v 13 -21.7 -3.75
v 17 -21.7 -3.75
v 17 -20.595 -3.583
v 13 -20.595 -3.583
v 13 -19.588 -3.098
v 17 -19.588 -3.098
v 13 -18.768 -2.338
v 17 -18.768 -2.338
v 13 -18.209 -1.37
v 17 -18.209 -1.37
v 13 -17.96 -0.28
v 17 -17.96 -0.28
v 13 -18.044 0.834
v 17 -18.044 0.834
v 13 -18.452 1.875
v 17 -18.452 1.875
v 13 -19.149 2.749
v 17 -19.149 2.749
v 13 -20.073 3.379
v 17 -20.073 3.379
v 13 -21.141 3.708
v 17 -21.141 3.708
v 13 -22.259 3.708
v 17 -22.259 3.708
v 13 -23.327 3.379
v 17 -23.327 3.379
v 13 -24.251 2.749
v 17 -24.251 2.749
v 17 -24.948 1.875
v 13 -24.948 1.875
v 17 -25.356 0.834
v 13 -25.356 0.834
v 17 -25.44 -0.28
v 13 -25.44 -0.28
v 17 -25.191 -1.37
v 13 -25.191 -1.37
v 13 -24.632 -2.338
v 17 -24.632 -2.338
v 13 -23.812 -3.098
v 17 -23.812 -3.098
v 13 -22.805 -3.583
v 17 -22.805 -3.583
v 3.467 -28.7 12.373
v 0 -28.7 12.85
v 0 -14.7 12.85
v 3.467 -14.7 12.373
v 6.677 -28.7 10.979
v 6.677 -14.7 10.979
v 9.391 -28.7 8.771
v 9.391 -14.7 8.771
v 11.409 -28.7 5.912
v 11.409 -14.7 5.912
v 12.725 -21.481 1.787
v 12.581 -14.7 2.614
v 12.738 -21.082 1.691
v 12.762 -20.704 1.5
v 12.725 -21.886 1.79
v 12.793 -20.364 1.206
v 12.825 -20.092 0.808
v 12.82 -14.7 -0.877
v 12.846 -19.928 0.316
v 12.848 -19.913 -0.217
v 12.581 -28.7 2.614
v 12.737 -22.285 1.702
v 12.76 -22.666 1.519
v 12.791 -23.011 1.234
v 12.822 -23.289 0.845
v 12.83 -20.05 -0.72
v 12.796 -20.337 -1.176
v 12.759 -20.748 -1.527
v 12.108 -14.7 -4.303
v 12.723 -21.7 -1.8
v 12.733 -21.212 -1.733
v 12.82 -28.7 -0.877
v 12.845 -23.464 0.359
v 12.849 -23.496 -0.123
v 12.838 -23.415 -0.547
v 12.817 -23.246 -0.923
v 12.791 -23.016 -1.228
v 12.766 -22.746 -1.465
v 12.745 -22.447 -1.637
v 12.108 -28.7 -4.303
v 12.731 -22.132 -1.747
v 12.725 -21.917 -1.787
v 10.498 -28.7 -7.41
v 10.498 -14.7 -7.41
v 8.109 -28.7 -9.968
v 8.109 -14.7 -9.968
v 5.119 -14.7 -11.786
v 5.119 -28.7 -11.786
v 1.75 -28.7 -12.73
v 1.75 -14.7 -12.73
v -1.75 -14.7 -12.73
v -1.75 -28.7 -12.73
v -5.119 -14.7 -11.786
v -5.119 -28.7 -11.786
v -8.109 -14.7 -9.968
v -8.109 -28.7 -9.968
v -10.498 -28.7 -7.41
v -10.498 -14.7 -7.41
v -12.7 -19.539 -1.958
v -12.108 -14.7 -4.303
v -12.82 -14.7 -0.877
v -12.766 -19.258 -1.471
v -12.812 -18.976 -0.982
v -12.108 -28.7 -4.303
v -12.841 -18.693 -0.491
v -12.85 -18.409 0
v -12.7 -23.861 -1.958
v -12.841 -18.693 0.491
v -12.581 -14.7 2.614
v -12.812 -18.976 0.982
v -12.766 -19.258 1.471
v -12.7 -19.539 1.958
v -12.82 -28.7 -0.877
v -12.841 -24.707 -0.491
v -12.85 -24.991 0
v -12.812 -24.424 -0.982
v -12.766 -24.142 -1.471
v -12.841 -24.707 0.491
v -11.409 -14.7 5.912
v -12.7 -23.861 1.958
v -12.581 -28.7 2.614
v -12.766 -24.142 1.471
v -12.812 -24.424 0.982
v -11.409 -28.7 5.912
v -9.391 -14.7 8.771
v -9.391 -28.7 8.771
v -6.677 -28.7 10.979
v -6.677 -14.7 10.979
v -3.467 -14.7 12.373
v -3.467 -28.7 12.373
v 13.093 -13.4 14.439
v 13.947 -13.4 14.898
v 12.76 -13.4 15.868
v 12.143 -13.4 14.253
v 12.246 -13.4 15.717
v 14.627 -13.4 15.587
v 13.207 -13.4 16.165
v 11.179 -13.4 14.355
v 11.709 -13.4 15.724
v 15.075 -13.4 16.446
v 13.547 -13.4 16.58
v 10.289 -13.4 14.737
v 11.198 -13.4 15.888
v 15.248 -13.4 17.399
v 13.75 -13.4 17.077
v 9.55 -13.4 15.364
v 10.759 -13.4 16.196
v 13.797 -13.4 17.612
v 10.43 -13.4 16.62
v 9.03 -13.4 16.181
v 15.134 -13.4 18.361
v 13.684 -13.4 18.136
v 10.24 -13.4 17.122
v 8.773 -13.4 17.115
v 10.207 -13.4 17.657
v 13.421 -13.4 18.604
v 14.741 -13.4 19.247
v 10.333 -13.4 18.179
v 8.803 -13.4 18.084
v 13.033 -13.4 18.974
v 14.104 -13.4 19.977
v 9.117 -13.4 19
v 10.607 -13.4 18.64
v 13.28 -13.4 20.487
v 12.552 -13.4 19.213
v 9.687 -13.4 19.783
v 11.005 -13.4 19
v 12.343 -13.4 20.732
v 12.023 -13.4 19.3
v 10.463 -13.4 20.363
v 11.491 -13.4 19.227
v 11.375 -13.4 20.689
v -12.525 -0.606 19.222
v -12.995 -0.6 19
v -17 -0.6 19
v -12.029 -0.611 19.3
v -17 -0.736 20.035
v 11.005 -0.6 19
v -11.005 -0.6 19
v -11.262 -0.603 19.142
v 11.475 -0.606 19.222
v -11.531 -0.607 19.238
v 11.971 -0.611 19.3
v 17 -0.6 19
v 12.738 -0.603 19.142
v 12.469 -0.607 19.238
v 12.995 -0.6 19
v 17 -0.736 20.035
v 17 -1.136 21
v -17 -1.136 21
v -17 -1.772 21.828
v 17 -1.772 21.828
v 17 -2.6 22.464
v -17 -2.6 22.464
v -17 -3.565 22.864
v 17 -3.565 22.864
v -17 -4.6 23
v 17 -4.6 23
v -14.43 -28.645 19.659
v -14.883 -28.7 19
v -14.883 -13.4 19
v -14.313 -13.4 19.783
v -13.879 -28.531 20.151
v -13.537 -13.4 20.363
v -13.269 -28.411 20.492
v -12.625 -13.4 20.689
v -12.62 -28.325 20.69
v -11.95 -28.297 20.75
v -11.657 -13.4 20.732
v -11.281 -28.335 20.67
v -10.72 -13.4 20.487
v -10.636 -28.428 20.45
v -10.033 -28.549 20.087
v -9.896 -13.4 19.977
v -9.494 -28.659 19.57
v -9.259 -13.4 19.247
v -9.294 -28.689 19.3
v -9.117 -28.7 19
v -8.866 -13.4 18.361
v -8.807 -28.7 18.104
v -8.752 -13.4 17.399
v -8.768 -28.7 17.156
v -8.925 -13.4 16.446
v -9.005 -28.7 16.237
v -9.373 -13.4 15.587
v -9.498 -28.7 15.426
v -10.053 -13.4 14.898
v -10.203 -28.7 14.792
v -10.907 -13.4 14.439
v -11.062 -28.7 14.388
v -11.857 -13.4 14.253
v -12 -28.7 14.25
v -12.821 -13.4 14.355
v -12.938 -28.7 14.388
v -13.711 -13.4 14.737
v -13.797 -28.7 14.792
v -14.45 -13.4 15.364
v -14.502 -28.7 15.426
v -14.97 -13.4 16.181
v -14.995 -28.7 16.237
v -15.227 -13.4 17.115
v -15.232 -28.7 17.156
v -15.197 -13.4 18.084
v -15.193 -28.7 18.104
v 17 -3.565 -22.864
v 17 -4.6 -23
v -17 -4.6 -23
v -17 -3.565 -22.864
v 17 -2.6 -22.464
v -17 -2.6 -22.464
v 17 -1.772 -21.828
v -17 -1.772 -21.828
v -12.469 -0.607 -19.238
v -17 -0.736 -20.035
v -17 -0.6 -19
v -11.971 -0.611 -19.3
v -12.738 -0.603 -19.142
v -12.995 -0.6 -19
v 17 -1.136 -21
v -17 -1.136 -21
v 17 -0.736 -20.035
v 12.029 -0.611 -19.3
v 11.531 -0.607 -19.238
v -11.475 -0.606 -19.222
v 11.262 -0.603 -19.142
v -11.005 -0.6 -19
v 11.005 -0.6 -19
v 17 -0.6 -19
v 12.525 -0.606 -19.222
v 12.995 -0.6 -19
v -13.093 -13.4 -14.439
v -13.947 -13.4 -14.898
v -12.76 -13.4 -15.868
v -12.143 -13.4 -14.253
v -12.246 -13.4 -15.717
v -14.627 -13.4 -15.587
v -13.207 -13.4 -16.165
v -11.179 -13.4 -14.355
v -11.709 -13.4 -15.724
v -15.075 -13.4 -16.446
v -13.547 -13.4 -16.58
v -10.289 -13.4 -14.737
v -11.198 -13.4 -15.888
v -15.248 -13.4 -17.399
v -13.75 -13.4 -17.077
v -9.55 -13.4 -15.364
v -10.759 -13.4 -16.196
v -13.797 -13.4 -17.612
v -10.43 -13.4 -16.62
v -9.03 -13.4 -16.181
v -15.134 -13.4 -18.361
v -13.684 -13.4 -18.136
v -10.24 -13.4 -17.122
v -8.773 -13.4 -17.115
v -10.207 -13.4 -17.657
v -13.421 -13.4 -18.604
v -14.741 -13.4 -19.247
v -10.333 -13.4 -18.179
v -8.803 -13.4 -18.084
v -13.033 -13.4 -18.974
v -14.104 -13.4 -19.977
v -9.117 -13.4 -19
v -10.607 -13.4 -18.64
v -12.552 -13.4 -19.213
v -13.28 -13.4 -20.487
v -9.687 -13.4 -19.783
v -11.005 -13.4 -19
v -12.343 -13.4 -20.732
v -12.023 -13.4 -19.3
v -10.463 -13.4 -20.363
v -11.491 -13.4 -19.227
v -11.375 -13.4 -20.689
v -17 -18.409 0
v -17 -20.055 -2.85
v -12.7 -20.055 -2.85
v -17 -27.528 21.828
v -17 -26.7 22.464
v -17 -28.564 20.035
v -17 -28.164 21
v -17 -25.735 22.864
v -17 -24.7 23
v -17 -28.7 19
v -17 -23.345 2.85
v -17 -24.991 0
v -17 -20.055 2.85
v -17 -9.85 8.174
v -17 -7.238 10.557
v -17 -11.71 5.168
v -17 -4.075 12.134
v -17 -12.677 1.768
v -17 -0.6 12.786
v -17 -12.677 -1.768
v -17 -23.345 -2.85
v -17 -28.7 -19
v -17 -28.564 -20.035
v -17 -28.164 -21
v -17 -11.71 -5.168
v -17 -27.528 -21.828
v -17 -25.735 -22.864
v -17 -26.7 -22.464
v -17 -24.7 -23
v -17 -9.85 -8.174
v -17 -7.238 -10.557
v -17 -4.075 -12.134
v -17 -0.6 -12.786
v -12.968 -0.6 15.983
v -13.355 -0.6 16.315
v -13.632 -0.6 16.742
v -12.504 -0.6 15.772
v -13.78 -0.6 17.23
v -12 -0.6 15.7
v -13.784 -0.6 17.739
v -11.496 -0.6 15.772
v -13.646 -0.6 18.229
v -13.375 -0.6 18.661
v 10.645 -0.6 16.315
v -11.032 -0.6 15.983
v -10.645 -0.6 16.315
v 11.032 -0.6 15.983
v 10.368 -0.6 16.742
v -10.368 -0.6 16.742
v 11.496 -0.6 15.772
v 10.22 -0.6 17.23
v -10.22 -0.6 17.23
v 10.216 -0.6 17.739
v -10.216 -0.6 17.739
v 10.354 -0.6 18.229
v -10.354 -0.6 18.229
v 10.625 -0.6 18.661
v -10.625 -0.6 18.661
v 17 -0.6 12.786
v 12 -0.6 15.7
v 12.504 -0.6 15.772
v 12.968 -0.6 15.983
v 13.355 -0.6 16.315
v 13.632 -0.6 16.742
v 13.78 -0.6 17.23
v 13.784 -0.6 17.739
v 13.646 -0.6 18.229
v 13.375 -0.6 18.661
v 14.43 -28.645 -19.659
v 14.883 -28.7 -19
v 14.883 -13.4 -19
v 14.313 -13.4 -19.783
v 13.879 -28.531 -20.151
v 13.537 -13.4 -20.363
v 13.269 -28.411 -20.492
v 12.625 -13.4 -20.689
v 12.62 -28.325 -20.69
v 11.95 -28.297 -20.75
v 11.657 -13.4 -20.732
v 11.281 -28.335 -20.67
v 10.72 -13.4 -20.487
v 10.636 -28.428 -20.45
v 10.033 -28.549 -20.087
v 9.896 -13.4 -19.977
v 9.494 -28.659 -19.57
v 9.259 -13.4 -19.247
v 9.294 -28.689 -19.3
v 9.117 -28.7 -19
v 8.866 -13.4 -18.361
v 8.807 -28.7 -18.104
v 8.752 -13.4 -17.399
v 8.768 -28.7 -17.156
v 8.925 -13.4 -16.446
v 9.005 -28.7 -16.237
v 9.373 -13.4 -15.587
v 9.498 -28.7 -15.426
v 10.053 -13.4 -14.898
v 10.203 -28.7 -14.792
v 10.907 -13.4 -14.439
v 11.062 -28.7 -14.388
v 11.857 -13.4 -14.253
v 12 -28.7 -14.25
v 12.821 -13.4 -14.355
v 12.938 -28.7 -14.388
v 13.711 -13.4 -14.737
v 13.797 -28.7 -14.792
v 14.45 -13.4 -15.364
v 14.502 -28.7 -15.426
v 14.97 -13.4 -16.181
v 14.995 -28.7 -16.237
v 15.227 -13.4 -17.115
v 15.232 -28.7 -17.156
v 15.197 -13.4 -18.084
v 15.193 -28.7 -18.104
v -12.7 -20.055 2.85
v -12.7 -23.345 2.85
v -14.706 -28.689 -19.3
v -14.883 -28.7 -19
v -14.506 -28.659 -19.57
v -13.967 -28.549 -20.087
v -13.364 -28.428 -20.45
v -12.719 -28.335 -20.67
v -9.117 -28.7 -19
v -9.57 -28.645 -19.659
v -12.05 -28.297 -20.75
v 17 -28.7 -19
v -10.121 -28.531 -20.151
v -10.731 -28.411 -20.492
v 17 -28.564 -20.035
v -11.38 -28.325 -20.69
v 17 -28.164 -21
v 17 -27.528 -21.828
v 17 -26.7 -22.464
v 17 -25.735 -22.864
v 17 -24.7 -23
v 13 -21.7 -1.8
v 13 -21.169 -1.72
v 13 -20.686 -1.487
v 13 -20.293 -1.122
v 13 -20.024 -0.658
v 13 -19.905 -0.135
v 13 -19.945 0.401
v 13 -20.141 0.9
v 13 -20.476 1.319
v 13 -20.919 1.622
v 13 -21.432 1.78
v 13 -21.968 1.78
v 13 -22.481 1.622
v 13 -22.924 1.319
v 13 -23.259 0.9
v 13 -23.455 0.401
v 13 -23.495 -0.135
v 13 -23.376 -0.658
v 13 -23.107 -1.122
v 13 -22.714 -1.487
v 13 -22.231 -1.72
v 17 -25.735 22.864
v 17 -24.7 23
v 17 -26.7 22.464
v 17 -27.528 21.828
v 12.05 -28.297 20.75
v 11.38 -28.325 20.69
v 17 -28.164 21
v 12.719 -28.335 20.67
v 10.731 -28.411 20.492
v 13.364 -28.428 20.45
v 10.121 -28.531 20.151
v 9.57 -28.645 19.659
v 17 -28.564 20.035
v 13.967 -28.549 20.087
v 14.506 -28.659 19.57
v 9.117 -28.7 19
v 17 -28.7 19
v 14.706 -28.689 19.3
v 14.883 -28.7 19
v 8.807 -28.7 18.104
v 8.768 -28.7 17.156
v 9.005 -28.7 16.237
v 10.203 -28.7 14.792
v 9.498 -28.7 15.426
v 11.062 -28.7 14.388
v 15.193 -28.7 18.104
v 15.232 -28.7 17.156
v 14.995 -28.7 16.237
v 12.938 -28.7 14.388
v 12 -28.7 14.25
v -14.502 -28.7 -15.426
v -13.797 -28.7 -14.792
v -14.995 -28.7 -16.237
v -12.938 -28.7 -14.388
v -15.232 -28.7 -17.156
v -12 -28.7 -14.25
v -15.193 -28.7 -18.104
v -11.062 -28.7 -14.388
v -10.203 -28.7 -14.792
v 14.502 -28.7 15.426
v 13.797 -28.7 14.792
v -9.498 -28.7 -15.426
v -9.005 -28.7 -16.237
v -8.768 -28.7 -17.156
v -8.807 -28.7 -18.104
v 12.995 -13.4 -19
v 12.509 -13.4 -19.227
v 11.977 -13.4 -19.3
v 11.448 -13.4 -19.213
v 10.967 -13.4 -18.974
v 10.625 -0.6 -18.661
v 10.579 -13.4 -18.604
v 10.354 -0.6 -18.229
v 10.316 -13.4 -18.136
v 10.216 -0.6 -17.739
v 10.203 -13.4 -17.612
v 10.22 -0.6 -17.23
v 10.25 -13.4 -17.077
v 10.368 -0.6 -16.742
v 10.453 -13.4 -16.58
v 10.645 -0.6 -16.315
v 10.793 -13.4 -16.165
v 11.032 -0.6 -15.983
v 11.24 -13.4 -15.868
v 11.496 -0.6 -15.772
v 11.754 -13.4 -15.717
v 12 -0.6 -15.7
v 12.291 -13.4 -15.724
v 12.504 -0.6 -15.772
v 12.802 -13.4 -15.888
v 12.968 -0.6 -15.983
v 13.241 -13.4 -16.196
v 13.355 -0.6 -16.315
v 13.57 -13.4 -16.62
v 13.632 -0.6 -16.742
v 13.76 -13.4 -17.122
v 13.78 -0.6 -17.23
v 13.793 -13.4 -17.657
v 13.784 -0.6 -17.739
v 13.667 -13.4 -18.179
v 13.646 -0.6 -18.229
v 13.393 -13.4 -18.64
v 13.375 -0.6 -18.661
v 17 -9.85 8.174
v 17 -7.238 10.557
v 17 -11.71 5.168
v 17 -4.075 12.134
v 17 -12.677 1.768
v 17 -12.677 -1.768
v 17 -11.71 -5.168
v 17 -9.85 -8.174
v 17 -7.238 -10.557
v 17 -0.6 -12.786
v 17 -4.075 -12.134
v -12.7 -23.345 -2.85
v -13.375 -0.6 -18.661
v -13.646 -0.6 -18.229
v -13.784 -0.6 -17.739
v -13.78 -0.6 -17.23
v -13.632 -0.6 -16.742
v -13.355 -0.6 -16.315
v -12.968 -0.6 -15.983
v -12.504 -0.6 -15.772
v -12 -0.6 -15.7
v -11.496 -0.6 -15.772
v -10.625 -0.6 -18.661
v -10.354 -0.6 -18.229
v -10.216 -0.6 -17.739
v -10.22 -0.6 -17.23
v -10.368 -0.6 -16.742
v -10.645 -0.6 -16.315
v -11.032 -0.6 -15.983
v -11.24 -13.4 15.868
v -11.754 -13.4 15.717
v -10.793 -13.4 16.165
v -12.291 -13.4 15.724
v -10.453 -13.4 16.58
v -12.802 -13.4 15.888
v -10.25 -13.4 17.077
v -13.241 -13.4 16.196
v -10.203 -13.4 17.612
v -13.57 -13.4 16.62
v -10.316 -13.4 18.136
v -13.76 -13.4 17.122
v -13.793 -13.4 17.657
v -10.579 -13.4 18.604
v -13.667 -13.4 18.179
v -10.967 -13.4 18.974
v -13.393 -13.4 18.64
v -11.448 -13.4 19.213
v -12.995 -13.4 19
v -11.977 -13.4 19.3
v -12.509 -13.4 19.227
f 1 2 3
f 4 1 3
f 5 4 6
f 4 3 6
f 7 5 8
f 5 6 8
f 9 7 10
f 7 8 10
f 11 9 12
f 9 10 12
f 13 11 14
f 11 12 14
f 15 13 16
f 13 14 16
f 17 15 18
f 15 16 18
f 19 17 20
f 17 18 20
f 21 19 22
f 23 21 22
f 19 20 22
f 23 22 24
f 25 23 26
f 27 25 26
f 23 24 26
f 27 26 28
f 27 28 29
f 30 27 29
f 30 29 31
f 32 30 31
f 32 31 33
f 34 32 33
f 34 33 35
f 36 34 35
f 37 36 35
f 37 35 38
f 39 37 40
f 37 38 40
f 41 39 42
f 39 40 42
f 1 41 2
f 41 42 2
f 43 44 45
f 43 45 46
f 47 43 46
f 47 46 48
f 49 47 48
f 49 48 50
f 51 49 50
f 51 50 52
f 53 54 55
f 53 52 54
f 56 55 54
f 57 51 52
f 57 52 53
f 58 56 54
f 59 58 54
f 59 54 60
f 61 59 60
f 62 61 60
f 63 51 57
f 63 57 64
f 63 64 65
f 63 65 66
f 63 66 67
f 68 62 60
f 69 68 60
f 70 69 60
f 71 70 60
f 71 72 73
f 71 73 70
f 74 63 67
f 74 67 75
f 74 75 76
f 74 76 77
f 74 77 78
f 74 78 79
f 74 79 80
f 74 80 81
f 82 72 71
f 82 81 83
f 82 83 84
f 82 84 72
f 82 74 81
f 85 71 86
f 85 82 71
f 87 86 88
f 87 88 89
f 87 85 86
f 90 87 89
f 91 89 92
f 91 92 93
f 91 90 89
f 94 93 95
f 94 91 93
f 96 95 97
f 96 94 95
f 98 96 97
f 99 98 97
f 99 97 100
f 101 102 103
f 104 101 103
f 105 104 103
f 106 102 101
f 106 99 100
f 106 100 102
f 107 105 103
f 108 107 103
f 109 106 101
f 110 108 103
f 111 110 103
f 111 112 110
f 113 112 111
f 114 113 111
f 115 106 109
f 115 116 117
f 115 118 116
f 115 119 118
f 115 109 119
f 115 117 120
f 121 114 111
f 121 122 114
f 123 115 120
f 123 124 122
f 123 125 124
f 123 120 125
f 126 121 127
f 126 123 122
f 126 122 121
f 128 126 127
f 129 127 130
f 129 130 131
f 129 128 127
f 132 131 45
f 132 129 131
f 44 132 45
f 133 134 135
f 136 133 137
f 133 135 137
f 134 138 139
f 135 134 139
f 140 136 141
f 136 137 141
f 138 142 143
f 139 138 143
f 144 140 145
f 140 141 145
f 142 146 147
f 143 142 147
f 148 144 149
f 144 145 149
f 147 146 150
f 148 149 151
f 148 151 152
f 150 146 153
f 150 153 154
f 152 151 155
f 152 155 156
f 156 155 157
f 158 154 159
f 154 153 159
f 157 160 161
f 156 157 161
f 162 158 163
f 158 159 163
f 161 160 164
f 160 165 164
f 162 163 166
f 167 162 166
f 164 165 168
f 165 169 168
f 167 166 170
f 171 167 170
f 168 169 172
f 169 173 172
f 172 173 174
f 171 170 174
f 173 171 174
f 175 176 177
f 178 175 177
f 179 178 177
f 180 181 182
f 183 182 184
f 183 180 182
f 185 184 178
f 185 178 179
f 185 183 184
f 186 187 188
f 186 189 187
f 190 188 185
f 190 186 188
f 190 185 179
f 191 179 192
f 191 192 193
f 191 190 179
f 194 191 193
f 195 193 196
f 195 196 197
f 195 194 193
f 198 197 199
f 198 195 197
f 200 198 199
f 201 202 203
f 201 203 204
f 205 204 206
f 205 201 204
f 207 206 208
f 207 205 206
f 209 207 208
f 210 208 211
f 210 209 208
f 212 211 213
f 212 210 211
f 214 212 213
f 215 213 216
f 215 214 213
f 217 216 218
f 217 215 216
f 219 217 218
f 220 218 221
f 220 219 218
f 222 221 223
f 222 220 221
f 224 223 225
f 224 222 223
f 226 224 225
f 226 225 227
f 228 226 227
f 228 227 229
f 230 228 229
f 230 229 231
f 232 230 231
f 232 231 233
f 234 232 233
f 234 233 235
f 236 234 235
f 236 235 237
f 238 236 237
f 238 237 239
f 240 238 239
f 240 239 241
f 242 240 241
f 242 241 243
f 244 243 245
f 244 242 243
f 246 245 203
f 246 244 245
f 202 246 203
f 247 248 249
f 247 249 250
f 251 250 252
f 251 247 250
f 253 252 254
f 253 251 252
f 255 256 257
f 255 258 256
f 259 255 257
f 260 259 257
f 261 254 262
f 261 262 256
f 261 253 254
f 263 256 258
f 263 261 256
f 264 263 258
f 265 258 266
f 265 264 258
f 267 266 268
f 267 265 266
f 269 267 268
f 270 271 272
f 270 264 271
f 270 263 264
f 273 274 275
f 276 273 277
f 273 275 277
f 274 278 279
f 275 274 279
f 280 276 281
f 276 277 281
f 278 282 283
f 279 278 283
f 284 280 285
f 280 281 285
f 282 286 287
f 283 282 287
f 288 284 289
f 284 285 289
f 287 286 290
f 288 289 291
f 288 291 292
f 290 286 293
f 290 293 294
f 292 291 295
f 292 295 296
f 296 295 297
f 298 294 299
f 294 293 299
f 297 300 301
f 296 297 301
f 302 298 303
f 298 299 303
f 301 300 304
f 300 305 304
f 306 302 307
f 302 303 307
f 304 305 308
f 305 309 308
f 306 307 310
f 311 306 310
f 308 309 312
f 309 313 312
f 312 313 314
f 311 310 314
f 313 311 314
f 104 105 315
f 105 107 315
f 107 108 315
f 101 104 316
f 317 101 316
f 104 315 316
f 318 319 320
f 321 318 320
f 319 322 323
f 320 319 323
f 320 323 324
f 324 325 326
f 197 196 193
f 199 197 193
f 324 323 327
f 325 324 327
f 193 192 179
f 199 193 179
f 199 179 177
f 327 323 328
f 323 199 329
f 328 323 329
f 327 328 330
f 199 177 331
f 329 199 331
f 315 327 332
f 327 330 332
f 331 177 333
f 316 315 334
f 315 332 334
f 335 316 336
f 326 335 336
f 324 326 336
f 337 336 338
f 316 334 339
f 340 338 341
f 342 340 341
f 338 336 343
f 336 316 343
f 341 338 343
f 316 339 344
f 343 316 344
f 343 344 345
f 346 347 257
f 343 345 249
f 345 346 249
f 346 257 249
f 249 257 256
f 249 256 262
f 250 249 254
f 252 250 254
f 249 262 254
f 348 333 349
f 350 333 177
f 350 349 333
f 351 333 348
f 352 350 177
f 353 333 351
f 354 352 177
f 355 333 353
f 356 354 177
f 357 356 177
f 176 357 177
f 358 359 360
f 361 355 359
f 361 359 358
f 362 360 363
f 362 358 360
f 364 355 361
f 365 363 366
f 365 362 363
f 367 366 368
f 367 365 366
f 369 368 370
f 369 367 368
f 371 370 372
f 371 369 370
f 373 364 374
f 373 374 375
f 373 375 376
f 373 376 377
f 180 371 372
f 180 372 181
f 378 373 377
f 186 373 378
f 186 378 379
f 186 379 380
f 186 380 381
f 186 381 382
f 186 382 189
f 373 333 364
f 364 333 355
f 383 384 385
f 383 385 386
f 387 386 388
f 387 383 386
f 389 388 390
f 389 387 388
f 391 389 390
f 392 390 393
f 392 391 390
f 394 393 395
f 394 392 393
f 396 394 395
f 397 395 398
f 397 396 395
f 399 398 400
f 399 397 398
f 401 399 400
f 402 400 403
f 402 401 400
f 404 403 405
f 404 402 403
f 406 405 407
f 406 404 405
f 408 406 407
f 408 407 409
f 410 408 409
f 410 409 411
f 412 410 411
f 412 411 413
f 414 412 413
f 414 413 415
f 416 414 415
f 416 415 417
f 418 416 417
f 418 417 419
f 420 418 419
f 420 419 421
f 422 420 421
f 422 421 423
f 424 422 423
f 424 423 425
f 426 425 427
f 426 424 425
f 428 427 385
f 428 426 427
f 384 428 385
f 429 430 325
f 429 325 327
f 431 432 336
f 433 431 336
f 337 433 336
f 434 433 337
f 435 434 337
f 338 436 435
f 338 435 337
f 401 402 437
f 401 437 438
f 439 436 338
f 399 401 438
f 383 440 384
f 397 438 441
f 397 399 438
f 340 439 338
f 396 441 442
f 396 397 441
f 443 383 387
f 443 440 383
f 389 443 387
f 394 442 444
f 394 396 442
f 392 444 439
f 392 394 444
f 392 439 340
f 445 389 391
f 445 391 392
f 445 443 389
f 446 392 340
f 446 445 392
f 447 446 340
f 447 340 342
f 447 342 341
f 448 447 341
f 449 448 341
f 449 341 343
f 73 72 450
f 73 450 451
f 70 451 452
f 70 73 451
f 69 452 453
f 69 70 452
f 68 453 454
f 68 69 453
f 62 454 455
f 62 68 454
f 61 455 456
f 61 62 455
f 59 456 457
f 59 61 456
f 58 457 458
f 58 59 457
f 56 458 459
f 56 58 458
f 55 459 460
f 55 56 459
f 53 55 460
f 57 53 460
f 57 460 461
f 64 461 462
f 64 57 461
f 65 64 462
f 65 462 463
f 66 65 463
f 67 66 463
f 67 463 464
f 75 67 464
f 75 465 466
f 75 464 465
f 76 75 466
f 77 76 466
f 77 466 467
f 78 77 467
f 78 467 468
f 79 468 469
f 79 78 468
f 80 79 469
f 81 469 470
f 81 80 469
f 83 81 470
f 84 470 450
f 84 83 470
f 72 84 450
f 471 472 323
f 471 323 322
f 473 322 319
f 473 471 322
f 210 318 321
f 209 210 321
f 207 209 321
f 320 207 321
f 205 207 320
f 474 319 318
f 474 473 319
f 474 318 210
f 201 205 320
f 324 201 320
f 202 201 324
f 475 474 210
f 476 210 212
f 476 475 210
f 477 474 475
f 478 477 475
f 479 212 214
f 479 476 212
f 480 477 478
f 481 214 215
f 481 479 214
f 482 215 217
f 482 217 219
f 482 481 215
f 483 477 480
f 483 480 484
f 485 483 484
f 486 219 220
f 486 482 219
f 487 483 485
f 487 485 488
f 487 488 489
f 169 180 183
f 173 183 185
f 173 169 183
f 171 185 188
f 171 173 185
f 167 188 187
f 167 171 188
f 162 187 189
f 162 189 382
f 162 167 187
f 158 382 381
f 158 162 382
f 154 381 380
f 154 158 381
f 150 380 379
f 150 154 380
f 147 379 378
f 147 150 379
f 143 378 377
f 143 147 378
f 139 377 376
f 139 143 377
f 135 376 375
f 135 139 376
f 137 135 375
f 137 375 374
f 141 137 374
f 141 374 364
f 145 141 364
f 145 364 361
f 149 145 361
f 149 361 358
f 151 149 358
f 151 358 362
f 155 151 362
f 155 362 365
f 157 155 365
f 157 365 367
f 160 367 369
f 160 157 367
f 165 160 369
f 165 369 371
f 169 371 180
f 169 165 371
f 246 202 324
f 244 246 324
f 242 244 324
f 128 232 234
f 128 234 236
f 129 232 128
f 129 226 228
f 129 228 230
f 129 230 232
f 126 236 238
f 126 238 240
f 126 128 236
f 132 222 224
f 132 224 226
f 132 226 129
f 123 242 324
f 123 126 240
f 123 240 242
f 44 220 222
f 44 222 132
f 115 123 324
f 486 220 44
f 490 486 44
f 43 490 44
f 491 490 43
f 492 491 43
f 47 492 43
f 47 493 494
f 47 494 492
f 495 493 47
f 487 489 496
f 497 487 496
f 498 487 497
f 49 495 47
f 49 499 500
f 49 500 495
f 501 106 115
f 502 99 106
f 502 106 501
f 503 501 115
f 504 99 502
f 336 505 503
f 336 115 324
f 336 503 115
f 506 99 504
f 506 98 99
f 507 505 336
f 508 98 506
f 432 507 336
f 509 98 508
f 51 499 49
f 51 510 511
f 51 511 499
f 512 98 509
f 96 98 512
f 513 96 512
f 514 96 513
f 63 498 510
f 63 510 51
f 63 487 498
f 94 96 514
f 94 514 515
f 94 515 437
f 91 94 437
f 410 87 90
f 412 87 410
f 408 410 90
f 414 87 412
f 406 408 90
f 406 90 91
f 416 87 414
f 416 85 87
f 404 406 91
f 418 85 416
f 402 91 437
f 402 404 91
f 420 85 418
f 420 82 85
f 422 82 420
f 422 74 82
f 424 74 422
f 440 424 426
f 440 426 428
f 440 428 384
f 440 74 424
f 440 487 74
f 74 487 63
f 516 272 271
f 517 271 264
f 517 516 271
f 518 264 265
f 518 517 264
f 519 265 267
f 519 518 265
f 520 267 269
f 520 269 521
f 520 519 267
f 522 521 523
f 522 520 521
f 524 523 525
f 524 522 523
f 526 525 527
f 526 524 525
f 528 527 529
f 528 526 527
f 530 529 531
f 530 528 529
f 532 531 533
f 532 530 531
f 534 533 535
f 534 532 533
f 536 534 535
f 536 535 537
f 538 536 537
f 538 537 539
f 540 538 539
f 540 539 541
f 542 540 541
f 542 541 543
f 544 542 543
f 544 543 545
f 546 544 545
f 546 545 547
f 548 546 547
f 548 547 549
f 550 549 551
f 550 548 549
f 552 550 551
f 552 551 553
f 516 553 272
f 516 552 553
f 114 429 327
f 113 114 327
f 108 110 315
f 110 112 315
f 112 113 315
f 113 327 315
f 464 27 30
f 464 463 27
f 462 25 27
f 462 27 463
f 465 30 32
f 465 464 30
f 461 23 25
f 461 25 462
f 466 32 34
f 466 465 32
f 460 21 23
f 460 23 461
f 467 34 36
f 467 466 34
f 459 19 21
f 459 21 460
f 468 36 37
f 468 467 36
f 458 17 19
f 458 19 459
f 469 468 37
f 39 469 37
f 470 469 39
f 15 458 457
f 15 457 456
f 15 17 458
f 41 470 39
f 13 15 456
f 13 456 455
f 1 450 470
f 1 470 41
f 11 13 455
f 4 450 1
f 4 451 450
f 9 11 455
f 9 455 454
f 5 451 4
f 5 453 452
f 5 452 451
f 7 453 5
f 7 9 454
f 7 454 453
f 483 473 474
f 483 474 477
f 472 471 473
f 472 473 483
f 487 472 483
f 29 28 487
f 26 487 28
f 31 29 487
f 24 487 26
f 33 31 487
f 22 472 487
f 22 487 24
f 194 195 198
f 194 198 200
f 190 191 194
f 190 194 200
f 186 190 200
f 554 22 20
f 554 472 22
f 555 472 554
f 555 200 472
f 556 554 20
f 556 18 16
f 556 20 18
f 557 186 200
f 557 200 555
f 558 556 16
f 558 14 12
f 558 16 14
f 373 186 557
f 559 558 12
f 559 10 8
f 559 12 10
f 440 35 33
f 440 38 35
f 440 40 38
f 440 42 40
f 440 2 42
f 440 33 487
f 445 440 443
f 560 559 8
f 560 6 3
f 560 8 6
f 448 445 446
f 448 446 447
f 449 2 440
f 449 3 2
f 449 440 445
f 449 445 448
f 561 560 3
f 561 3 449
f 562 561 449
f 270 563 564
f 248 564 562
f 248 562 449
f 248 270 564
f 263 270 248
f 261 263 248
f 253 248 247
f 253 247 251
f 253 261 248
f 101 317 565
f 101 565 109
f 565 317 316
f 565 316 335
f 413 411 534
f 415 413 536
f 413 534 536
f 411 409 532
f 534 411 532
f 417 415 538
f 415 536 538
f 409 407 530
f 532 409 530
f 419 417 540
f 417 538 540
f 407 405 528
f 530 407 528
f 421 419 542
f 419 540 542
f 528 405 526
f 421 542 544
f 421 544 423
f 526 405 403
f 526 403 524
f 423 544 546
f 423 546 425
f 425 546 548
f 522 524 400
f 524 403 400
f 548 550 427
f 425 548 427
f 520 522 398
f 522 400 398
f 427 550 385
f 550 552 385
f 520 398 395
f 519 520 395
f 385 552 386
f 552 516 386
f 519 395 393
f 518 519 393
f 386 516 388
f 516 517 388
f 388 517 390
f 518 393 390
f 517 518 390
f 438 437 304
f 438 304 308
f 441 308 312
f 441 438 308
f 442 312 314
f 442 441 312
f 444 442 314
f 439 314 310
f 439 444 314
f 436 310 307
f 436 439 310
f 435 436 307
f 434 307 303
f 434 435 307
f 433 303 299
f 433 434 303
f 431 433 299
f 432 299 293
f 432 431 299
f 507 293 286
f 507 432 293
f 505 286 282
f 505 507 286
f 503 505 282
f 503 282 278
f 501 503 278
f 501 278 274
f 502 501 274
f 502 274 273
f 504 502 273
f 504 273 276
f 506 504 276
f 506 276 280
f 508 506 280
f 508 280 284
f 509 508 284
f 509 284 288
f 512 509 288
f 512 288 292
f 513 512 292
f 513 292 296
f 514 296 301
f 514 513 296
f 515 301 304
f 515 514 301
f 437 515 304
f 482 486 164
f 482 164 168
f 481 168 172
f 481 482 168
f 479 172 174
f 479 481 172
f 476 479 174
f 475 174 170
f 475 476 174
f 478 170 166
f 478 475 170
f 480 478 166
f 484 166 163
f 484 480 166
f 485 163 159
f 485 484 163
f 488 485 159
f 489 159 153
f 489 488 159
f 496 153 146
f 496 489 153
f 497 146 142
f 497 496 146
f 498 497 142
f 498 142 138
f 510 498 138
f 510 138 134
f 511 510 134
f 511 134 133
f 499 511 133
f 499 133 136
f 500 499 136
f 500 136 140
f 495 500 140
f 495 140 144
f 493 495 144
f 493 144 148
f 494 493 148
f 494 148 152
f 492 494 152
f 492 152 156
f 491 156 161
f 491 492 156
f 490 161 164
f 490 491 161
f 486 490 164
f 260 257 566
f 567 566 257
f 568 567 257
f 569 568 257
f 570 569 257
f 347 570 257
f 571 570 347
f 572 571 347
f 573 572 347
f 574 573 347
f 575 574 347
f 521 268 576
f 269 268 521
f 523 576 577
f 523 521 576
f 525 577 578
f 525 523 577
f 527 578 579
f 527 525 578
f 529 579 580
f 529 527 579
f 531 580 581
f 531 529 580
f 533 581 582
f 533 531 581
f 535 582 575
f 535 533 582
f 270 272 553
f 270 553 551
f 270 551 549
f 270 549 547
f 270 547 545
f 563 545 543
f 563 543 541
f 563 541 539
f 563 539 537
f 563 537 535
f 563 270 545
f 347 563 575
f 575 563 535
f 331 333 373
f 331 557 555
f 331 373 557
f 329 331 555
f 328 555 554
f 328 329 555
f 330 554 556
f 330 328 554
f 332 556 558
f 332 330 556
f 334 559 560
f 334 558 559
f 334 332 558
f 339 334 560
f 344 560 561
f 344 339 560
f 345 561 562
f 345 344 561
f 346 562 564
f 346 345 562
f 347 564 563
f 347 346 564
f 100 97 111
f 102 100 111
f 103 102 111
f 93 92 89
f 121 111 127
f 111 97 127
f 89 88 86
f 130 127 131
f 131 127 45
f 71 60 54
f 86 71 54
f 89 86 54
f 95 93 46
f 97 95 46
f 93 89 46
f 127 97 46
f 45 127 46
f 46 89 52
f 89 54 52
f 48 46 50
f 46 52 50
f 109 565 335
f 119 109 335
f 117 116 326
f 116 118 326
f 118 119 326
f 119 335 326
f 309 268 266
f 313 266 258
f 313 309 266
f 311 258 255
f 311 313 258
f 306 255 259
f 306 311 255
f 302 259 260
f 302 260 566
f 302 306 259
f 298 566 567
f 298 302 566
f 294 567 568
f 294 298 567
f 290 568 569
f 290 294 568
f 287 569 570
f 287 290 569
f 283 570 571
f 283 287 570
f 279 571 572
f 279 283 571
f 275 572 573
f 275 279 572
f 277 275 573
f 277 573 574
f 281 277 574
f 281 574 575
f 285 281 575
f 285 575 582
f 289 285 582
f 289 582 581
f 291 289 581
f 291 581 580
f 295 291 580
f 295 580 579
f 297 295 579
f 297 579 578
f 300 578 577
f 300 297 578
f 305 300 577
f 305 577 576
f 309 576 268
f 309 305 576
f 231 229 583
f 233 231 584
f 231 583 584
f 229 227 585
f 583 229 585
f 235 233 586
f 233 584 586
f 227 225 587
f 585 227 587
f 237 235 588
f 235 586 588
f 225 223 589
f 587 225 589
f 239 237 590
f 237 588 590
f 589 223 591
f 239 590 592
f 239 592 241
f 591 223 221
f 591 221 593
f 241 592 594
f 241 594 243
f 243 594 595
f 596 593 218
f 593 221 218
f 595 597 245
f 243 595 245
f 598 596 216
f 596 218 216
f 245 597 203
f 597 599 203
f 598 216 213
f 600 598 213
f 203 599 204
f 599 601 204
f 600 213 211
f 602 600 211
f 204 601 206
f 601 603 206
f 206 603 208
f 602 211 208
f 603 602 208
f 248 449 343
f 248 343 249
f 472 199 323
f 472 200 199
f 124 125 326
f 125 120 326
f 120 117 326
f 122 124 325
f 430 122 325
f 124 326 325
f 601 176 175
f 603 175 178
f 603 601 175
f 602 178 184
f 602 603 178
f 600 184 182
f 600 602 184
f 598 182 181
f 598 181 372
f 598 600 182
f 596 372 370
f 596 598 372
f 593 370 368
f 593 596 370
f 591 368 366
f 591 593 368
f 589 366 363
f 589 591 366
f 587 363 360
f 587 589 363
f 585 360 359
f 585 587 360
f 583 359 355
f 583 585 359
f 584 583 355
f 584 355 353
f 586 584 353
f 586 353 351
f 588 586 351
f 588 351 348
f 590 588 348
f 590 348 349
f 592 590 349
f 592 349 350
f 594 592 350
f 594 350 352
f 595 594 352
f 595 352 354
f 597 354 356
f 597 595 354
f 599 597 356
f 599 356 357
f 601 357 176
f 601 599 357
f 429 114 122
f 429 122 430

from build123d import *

# Parameters (mm, degrees)
BOSS_EXTRUDE1_DEPTH     = 17
CUT_EXTRUDE1_DEPTH      = 41.517773878
CUT_EXTRUDE1_DEPTH_BACK = 41.517773878
SKETCH2_R               = 12.8
SKETCH3_R               = 1.8
CUT_EXTRUDE2_DEPTH      = 28.5
SKETCH4_R               = 3.25
CUT_EXTRUDE3_DEPTH      = 15.3
SKETCH5_R               = 12.85
CUT_EXTRUDE4_DEPTH      = 14
CUT_EXTRUDE5_DEPTH      = 41.517774047
CUT_EXTRUDE5_DEPTH_BACK = 41.517774047
SKETCH6_R               = 1.8
SKETCH7_R               = 3.75
CUT_EXTRUDE6_DEPTH      = 4
CUT_EXTRUDE7_DEPTH      = 4.3


with BuildPart() as part:
    # Sketch1 → Boss-Extrude1 (new, symmetric)
    with BuildSketch(Plane(origin=(0, 0, 0), x_dir=(0, 0, -1), z_dir=(1, 0, 0))):
        with BuildLine():
            Line((-19, -28.7), (19, -28.7))
            ThreePointArc((19, -28.7), (21.828427125, -27.528427125), (23, -24.7))
            Line((23, -24.7), (23, -4.6))
            ThreePointArc((23, -4.6), (21.828427125, -1.771572875), (19, -0.6))
            Line((19, -0.6), (-19, -0.6))
            ThreePointArc((-19, -0.6), (-21.828427125, -1.771572875), (-23, -4.6))
            Line((-23, -4.6), (-23, -24.7))
            ThreePointArc((-23, -24.7), (-21.828427125, -27.528427125), (-19, -28.7))
        make_face()
    extrude(amount=BOSS_EXTRUDE1_DEPTH, both=True)

    # Sketch2 → Cut-Extrude1 (cut, two sides: drawn at the far end of the back side and taken through both)
    with BuildSketch(Plane(origin=(0, 0, 0), x_dir=(0, 0, -1), z_dir=(1, 0, 0)).offset(-CUT_EXTRUDE1_DEPTH_BACK)):
        Circle(SKETCH2_R)
    extrude(amount=CUT_EXTRUDE1_DEPTH + CUT_EXTRUDE1_DEPTH_BACK, mode=Mode.SUBTRACT)

    # Sketch3 → Cut-Extrude2 (cut)
    with BuildSketch(Plane(origin=(0, -28.7, 0), x_dir=(1, 0, 0), z_dir=(0, 1, 0))):
        with Locations(Location((12, -17.5, 0), (0, 0, 236.442690238))):
            Circle(SKETCH3_R)
        with Locations(Location((12, 17.5, 0), (0, 0, 56.442690238))):
            Circle(SKETCH3_R)
        with Locations(Location((-12, -17.5, 0), (0, 0, 236.442690238))):
            Circle(SKETCH3_R)
        with Locations(Location((-12, 17.5, 0), (0, 0, 56.442690238))):
            Circle(SKETCH3_R)
    extrude(amount=CUT_EXTRUDE2_DEPTH, mode=Mode.SUBTRACT)

    # Sketch4 → Cut-Extrude3 (cut)
    with BuildSketch(Plane(origin=(0, -28.7, 0), x_dir=(1, 0, 0), z_dir=(0, 1, 0))):
        with Locations(Location((12, -17.5, 0), (0, 0, 207.48642625))):
            Circle(SKETCH4_R)
        with Locations(Location((12, 17.5, 0), (0, 0, 27.48642625))):
            Circle(SKETCH4_R)
        with Locations(Location((-12, -17.5, 0), (0, 0, 207.48642625))):
            Circle(SKETCH4_R)
        with Locations(Location((-12, 17.5, 0), (0, 0, 27.48642625))):
            Circle(SKETCH4_R)
    extrude(amount=CUT_EXTRUDE3_DEPTH, mode=Mode.SUBTRACT)

    # Sketch5 → Cut-Extrude4 (cut)
    with BuildSketch(Plane(origin=(0, -28.7, 0), x_dir=(1, 0, 0), z_dir=(0, 1, 0))):
        with Locations(Location((0, 0, 0), (0, 0, 270))):
            Circle(SKETCH5_R)
    extrude(amount=CUT_EXTRUDE4_DEPTH, mode=Mode.SUBTRACT)

    # Sketch6 → Cut-Extrude5 (cut, two sides: drawn at the far end of the back side and taken through both)
    with BuildSketch(Plane(origin=(0, 0, 0), x_dir=(0, 0, -1), z_dir=(1, 0, 0)).offset(-CUT_EXTRUDE5_DEPTH_BACK)):
        with Locations((0, -21.7)):
            Circle(SKETCH6_R)
    extrude(amount=CUT_EXTRUDE5_DEPTH + CUT_EXTRUDE5_DEPTH_BACK, mode=Mode.SUBTRACT)

    # Sketch7 → Cut-Extrude6 (cut)
    with BuildSketch(Plane(origin=(17, 0, 0), x_dir=(0, 0, -1), z_dir=(1, 0, 0))):
        with Locations((0, -21.7)):
            Circle(SKETCH7_R)
    extrude(amount=-CUT_EXTRUDE6_DEPTH, mode=Mode.SUBTRACT)

    # Sketch8 → Cut-Extrude7 (cut)
    with BuildSketch(Plane(origin=(-17, 0, 0), x_dir=(0, 0, -1), z_dir=(1, 0, 0))):
        Polygon((-2.85, -20.054551733), (0, -18.409103466), (2.85, -20.054551733), (2.85, -23.345448267), (0, -24.990896534), (-2.85, -23.345448267), align=None)
    extrude(amount=CUT_EXTRUDE7_DEPTH, mode=Mode.SUBTRACT)


solid = part.part
